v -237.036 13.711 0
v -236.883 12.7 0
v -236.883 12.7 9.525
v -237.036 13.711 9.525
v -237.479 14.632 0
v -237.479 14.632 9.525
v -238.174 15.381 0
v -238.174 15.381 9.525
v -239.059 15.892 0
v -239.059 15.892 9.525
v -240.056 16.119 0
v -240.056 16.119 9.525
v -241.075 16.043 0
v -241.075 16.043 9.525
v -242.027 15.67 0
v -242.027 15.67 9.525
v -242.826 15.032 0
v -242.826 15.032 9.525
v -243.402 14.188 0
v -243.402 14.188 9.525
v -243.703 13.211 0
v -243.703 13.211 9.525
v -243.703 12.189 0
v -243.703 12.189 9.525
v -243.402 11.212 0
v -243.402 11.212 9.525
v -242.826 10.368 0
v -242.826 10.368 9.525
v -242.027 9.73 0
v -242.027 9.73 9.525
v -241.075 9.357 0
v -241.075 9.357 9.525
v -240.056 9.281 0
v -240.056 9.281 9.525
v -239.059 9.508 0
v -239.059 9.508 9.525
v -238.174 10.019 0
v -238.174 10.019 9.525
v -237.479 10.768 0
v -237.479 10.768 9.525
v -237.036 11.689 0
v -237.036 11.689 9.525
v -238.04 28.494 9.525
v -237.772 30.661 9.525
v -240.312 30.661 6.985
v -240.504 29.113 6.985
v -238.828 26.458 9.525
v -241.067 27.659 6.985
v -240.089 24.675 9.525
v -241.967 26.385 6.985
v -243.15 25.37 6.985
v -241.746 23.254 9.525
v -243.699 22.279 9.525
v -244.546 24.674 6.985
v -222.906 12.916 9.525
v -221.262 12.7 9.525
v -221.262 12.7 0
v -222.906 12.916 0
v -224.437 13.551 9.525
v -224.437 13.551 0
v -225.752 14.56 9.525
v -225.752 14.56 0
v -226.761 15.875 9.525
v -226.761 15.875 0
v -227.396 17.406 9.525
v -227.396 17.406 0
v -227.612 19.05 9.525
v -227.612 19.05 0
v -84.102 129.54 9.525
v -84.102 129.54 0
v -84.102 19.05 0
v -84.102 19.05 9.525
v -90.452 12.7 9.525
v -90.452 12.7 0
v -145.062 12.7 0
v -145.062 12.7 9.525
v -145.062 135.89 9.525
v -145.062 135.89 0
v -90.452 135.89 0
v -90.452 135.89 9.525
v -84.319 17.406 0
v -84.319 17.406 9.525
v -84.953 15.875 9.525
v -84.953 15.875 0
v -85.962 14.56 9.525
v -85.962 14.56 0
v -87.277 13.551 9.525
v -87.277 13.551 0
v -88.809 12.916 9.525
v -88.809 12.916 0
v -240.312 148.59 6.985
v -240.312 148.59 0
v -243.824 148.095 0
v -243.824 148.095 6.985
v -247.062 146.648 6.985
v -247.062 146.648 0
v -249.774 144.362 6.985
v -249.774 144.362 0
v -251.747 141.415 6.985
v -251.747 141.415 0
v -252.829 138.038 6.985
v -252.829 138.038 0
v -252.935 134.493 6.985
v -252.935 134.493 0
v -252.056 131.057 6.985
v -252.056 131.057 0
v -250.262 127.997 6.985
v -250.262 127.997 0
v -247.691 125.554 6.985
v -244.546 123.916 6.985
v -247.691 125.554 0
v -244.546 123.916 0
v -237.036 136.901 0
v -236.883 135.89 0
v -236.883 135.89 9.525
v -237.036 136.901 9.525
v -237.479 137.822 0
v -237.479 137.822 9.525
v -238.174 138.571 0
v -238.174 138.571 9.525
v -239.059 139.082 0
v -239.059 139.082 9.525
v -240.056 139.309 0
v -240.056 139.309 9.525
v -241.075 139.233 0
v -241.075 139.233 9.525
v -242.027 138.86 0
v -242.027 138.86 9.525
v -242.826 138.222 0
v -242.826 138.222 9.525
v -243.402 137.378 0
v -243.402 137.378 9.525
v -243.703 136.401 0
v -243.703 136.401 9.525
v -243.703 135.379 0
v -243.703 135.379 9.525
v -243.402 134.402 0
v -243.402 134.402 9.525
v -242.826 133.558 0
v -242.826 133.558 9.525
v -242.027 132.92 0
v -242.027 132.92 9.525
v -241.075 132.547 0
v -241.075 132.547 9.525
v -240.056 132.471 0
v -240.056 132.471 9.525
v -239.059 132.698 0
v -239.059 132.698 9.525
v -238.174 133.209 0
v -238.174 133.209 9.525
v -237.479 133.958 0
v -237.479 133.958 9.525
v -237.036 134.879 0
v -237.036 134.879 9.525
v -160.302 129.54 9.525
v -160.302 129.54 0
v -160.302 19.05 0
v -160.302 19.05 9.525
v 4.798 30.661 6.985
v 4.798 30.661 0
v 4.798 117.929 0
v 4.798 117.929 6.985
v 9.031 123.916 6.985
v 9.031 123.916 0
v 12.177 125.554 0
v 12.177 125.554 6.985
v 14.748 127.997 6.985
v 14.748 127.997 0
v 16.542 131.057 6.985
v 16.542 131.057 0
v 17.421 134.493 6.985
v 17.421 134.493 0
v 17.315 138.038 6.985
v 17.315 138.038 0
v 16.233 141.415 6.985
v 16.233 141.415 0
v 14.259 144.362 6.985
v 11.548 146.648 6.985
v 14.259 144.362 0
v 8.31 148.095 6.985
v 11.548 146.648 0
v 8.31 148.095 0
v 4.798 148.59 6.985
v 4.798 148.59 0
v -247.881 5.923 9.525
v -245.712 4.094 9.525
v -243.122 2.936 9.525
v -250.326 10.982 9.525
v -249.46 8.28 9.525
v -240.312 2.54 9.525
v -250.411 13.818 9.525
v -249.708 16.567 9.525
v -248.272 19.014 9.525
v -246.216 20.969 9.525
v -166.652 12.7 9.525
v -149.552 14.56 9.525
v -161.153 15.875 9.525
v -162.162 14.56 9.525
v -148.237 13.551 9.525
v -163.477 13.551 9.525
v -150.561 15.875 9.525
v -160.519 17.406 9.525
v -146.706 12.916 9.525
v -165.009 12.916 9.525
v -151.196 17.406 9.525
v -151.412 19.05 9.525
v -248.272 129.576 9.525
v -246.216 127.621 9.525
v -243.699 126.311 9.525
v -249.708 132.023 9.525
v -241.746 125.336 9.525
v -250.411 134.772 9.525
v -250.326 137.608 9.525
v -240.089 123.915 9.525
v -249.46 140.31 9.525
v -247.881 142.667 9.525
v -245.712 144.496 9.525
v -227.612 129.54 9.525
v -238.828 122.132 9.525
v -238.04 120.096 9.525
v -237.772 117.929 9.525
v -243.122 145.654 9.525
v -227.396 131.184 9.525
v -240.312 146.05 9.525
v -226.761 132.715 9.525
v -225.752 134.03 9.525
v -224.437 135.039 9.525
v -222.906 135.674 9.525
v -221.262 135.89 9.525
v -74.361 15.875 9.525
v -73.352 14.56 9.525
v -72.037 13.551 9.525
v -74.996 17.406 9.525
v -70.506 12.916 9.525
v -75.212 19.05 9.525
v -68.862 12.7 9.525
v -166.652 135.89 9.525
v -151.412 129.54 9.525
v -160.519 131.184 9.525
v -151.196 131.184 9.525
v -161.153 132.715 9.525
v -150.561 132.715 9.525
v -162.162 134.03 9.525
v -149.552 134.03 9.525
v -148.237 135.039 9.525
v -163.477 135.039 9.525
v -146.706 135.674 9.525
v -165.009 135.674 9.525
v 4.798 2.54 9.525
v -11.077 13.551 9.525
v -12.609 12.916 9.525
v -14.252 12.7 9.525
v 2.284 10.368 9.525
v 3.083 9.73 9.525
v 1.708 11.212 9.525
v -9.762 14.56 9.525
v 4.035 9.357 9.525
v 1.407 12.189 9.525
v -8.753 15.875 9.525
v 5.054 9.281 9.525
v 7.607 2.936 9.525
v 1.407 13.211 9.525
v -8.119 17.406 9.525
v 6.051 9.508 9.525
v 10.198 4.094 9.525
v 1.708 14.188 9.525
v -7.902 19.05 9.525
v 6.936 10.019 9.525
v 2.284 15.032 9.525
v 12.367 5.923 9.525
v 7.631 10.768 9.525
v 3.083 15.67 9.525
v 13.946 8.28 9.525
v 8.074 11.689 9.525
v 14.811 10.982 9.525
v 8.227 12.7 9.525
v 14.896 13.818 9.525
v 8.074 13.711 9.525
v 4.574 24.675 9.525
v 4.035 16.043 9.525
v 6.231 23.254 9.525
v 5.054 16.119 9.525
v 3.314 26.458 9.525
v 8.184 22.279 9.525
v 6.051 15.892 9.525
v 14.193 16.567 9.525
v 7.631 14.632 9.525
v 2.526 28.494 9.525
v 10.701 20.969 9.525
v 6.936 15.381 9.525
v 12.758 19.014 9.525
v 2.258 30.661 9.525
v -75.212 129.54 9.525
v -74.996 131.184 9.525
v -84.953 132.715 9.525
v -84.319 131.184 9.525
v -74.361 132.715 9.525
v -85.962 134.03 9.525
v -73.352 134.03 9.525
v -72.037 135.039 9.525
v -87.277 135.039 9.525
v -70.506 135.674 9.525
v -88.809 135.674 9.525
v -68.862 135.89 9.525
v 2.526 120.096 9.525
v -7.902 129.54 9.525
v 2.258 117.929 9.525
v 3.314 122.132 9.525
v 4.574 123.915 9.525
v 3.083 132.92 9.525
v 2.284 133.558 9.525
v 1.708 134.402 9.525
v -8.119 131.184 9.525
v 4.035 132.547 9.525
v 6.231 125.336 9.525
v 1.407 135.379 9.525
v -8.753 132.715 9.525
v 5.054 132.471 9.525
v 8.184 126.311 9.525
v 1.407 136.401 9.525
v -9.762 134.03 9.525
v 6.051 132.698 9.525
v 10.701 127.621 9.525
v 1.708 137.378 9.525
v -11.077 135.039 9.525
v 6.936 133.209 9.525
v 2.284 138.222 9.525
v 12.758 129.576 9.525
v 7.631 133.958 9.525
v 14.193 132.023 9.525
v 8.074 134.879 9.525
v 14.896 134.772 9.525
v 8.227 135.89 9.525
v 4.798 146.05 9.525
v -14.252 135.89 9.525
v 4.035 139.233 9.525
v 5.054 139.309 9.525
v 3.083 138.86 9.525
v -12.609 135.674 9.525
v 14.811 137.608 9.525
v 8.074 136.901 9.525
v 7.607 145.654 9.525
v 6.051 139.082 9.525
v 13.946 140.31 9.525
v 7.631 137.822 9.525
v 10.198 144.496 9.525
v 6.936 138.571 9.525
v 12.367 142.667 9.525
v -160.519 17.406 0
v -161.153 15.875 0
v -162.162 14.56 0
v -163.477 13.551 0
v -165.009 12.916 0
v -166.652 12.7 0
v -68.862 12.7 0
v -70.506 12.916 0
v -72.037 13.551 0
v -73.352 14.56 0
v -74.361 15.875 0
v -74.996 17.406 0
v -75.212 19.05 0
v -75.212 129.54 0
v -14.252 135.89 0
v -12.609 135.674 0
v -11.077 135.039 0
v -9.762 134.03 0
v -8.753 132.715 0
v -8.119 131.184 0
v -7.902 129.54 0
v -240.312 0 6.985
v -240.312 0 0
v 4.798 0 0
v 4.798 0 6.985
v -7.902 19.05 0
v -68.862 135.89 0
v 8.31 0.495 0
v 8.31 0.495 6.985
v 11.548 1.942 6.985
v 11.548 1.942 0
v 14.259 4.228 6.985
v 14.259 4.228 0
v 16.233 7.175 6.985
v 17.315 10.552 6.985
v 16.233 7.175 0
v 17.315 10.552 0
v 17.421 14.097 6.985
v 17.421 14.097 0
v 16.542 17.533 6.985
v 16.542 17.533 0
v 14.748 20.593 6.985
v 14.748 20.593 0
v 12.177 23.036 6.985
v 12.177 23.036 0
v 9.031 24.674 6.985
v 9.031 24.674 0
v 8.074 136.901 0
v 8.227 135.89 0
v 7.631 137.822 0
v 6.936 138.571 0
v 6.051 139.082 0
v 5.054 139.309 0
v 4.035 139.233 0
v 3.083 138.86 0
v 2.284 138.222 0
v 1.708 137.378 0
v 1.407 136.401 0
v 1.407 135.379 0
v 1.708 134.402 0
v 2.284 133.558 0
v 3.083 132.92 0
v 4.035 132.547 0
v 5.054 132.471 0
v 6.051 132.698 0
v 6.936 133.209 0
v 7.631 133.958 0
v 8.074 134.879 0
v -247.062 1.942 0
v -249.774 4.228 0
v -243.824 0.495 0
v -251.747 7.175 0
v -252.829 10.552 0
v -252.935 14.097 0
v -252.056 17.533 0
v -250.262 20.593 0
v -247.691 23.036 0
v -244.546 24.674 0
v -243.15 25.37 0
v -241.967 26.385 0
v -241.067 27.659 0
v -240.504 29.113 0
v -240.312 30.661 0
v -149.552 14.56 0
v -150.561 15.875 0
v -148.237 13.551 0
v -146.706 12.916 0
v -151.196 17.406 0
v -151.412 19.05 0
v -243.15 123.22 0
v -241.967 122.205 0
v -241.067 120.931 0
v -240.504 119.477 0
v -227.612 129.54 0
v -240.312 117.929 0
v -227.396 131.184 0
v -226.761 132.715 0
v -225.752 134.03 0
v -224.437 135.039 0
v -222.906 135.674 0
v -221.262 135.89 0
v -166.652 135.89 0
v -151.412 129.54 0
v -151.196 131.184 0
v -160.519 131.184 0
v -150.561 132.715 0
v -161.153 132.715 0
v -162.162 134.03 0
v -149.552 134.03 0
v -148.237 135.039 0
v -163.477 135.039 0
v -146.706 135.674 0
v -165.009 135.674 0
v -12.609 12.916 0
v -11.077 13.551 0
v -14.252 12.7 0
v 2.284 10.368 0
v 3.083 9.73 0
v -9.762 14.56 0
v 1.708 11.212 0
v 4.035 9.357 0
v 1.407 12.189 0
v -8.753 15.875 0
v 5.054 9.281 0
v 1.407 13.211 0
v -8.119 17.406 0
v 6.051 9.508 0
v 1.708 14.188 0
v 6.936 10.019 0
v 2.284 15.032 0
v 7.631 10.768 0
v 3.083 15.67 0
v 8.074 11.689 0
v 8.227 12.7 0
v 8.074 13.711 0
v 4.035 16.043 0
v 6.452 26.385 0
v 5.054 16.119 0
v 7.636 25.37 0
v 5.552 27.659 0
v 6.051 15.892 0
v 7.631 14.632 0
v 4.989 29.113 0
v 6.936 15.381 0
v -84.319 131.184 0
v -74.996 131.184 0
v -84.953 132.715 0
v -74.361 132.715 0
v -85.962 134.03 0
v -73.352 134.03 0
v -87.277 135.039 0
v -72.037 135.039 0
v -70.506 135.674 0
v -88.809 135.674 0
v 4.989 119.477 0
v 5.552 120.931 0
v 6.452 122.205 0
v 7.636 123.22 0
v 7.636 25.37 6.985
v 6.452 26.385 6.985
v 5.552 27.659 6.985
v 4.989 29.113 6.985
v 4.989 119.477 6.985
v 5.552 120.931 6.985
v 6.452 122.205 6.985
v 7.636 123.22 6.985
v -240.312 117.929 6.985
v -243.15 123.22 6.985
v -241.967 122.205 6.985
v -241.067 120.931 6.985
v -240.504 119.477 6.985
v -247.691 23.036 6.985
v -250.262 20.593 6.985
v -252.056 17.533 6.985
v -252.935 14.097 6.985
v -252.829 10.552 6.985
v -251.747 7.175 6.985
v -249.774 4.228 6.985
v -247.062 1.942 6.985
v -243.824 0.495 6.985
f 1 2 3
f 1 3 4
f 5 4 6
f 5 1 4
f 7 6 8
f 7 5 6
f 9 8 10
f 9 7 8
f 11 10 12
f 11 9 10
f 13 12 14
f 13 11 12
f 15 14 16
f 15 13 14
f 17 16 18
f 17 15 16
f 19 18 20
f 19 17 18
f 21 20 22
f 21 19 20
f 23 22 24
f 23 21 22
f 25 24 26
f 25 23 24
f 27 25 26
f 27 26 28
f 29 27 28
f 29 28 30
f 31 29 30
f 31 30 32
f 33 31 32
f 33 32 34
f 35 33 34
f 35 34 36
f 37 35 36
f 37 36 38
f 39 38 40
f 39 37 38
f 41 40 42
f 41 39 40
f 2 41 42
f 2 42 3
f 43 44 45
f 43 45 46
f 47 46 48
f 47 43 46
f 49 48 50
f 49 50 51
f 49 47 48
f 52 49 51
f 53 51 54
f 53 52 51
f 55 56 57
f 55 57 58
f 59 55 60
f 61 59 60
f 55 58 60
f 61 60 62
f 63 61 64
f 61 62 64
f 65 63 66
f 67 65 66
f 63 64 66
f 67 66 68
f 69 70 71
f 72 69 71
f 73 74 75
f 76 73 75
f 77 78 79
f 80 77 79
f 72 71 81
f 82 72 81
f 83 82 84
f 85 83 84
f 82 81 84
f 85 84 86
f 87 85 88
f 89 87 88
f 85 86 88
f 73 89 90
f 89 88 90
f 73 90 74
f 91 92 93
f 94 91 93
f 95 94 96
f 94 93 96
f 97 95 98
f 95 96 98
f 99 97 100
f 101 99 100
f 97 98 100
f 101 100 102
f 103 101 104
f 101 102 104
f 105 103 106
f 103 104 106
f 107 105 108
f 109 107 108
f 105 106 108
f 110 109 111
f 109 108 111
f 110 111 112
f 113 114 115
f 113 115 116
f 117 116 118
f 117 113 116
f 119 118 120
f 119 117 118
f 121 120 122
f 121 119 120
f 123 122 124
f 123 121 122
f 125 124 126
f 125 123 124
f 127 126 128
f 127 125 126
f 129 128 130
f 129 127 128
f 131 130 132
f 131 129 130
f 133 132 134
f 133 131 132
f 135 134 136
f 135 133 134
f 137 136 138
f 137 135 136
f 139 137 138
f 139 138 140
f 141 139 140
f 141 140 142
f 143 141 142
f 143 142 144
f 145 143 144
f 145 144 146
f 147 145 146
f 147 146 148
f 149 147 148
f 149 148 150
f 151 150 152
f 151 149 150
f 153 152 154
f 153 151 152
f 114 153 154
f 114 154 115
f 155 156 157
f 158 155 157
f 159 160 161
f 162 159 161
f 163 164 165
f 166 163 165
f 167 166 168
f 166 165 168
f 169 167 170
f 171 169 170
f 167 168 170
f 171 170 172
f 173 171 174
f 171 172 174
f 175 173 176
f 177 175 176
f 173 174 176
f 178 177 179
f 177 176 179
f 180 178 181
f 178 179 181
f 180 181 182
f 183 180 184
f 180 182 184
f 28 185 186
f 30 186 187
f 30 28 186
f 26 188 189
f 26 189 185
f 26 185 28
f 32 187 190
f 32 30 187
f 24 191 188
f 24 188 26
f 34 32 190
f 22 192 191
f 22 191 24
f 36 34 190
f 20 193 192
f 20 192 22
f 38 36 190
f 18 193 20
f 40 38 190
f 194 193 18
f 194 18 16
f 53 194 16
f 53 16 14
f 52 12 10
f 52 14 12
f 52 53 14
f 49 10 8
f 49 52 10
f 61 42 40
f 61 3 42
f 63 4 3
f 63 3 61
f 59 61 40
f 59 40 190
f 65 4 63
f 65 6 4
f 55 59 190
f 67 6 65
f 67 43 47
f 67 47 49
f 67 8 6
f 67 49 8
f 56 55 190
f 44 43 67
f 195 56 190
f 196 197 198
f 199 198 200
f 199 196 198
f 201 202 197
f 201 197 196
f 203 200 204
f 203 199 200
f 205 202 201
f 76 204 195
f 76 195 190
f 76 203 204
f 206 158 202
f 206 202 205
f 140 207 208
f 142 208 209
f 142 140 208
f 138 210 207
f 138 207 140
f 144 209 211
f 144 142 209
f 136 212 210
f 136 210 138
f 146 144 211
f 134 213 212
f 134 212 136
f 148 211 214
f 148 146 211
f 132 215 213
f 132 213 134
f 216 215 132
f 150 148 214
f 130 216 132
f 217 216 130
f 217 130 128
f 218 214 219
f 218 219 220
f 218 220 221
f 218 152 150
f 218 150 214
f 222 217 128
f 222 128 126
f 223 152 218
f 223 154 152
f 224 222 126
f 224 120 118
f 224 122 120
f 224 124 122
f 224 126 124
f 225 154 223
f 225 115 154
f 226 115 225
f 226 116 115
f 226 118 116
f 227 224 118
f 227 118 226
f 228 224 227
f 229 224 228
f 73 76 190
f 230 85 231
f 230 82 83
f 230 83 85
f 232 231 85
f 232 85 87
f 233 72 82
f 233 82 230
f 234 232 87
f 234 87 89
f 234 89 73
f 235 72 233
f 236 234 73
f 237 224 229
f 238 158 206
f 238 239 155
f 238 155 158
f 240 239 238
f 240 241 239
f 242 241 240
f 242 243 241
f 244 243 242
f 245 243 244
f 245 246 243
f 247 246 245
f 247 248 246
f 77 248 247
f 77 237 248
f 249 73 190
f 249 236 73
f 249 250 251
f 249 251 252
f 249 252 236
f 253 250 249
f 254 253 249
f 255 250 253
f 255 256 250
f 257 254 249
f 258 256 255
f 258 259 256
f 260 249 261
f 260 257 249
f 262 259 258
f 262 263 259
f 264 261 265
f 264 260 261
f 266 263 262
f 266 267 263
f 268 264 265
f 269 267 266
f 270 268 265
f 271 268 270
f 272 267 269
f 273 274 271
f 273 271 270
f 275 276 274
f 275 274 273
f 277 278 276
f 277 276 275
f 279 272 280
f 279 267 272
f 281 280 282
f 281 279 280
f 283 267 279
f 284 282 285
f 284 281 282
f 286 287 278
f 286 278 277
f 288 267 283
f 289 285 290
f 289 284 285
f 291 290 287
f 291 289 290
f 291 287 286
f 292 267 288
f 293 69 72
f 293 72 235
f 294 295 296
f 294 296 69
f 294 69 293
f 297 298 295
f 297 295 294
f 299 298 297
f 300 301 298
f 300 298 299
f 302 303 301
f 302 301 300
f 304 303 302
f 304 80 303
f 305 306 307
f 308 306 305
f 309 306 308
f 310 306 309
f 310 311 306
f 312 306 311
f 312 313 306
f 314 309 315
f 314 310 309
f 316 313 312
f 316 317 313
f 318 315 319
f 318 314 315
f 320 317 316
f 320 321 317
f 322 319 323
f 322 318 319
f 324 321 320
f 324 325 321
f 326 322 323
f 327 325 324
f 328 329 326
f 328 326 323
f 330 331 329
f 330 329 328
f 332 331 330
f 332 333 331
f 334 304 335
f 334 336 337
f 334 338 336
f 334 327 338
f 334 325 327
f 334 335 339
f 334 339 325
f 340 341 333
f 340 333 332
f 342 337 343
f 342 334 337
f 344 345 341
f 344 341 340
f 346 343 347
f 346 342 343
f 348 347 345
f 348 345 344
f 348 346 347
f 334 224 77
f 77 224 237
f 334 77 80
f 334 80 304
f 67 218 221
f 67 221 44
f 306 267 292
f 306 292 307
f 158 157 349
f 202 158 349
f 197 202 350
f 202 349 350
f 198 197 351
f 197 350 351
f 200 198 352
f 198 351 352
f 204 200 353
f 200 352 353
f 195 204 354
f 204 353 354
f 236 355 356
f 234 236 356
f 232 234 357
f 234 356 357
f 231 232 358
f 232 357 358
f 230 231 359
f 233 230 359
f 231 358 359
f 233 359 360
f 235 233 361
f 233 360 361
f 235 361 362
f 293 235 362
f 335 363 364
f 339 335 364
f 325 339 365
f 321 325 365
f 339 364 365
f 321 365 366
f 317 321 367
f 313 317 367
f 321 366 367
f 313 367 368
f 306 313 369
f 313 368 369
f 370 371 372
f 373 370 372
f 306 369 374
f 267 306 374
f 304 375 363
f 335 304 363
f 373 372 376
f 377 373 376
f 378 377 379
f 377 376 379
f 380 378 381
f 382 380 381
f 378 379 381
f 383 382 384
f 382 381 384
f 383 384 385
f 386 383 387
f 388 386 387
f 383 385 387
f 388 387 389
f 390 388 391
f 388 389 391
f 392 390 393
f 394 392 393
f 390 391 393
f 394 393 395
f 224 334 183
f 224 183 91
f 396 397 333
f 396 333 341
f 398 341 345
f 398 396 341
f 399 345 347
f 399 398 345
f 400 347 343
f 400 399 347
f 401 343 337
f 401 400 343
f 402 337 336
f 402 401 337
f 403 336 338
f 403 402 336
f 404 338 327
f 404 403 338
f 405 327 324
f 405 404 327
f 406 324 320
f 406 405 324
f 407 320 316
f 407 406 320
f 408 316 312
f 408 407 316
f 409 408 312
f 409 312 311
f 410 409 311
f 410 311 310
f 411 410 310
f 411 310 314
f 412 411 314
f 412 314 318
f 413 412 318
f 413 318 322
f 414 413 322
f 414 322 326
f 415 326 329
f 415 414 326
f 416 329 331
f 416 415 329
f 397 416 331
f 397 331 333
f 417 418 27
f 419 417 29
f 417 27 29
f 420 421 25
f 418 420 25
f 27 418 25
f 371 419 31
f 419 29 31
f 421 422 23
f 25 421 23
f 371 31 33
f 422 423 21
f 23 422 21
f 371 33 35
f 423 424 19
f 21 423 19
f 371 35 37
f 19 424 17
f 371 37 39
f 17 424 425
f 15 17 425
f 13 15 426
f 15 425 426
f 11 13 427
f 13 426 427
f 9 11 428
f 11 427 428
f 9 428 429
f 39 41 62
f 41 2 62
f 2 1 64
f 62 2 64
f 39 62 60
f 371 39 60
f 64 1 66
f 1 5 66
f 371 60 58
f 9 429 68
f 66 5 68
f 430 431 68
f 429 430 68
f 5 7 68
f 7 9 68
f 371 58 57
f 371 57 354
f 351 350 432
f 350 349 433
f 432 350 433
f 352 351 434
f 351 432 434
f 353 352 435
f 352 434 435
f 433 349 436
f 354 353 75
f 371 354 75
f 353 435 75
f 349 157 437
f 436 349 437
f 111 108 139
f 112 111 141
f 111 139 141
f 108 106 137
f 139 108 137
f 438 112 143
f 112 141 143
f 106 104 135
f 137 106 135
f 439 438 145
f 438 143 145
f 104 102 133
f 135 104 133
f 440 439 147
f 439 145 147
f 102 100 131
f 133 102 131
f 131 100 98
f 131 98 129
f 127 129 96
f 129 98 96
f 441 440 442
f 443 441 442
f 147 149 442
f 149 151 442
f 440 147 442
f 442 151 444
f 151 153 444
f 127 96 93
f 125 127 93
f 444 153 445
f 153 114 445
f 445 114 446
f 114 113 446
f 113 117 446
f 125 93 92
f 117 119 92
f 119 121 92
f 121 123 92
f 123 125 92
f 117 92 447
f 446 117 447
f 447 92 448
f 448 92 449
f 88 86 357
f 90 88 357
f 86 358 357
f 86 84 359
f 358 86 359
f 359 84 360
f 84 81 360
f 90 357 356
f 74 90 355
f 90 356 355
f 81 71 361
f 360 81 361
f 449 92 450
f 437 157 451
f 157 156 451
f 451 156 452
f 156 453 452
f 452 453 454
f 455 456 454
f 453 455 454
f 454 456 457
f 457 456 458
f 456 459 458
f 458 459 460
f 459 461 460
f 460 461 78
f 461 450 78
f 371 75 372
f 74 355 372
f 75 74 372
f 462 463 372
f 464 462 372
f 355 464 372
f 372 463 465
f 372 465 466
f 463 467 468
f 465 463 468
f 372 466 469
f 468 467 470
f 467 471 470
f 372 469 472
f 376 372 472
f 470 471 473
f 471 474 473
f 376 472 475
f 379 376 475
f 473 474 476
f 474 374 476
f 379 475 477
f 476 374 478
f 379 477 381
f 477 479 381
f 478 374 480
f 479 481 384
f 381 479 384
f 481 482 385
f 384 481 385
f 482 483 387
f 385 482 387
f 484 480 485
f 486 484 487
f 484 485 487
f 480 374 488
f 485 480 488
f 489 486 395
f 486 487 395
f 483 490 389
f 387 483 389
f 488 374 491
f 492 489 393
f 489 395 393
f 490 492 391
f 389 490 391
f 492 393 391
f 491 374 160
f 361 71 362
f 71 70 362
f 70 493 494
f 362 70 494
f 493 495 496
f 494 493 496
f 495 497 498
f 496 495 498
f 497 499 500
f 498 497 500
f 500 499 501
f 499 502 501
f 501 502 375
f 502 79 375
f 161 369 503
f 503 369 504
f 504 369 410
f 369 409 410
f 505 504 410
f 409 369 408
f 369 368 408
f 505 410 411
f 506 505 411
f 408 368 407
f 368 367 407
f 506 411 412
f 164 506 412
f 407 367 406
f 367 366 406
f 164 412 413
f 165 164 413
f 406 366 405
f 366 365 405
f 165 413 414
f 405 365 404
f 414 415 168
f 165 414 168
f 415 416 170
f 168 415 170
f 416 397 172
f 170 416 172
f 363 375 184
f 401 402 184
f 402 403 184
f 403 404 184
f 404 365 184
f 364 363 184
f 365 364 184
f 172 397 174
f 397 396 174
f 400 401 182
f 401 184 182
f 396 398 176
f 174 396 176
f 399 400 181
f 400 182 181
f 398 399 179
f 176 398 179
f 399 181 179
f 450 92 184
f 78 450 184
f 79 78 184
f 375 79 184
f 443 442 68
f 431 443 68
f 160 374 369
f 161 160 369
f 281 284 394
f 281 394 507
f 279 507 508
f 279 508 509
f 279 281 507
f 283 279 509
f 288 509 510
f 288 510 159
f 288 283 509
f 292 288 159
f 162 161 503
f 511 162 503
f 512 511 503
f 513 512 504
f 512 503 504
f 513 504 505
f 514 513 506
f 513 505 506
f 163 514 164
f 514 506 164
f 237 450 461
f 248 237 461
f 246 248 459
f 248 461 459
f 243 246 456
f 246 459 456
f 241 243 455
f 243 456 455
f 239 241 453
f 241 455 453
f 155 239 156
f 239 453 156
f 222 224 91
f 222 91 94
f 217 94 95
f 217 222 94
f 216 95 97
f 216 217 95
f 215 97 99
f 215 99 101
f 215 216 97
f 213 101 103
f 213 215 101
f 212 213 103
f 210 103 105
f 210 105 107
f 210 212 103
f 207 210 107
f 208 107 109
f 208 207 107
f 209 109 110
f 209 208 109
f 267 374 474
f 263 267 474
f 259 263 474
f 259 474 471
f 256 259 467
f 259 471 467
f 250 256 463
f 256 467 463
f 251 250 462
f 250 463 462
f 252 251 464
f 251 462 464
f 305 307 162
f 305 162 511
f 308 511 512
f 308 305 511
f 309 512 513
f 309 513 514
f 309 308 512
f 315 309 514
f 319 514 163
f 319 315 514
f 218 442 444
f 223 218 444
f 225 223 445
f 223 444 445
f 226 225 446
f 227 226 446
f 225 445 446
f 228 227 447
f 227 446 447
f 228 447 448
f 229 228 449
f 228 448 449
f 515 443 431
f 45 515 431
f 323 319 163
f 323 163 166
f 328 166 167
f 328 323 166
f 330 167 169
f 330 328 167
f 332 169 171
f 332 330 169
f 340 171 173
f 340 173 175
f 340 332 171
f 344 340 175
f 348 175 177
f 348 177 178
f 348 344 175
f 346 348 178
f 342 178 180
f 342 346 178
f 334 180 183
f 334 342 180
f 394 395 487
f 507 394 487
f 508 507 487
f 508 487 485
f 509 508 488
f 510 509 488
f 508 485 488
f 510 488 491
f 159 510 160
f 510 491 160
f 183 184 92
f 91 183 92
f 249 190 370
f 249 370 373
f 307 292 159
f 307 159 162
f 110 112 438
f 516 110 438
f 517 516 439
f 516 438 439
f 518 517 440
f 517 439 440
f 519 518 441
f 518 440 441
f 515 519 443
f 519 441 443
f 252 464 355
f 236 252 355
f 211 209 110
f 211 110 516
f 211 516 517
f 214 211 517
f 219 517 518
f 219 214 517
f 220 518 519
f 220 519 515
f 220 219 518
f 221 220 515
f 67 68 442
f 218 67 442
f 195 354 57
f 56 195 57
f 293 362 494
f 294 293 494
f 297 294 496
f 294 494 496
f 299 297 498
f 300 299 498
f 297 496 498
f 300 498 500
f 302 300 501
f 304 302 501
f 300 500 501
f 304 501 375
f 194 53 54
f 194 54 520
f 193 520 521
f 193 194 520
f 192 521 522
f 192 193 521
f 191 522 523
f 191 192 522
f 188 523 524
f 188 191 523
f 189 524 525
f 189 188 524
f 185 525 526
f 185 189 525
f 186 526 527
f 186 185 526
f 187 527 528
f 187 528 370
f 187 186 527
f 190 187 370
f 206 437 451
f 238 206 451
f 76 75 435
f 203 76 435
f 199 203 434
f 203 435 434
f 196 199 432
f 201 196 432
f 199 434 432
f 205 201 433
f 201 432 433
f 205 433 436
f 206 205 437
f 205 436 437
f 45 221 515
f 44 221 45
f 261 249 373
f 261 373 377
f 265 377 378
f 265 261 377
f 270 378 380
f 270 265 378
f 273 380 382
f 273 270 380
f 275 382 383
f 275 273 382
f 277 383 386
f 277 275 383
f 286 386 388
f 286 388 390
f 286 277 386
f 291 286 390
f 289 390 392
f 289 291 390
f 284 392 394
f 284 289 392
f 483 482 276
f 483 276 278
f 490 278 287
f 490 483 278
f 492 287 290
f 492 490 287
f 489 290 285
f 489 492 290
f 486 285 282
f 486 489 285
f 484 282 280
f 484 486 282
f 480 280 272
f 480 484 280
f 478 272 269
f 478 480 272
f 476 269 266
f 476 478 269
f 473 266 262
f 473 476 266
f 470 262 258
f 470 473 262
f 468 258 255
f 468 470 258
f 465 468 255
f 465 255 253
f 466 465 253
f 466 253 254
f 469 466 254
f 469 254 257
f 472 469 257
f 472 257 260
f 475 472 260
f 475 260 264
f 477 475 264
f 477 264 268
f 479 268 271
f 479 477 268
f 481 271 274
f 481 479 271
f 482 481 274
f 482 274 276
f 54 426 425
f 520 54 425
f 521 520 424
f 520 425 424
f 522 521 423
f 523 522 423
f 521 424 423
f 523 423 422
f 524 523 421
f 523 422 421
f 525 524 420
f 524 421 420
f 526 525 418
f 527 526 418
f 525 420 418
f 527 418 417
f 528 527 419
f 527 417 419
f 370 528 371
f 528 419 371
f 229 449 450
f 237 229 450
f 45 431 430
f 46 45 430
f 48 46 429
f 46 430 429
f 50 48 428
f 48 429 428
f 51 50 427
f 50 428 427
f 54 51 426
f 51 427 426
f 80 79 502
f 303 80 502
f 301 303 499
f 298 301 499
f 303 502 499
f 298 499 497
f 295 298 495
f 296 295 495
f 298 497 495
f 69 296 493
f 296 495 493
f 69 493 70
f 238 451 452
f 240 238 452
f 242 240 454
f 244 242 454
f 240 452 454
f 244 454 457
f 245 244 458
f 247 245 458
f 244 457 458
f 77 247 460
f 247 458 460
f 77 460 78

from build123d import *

# Parameters (mm, degrees)
F0_R     = 3.429
F1_DEPTH = 9.525
F2_SIZE  = 2.54


with BuildPart() as f1:
    # F0 (on Top) → F1 (new body)
    with BuildSketch(Plane.XY):
        with BuildLine():
            Line((-117.757219, 148.59), (-240.312219, 148.59))
            ThreePointArc((-240.312219, 148.59), (-252.82932, 138.037595), (-244.545552, 123.916325))
            ThreePointArc((-244.545552, 123.916325), (-241.477465, 121.595662), (-240.312219, 117.929488))
            Line((-240.312219, 117.929488), (-240.312219, 30.660512))
            ThreePointArc((-240.312219, 30.660512), (-241.477465, 26.994338), (-244.545552, 24.673675))
            ThreePointArc((-244.545552, 24.673675), (-252.82932, 10.552405), (-240.312219, 0))
            Line((-240.312219, 0), (-117.757219, 0))
            Line((-117.757219, 0), (-117.757219, 12.7))
            Line((-117.757219, 12.7), (-145.062219, 12.7))
            ThreePointArc((-145.062219, 12.7), (-149.552347, 14.559872), (-151.412219, 19.05))
            Line((-151.412219, 19.05), (-151.412219, 129.54))
            ThreePointArc((-151.412219, 129.54), (-149.552347, 134.030128), (-145.062219, 135.89))
            Line((-145.062219, 135.89), (-117.757219, 135.89))
            Line((-117.757219, 135.89), (-117.757219, 148.59))
        make_face()
        with Locations((-240.312219, 12.7)):
            Circle(F0_R, mode=Mode.SUBTRACT)
        with BuildLine():
            ThreePointArc((-227.612219, 129.54), (-225.752347, 134.030128), (-221.262219, 135.89))
            Line((-221.262219, 135.89), (-166.652219, 135.89))
            ThreePointArc((-166.652219, 135.89), (-162.162091, 134.030128), (-160.302219, 129.54))
            Line((-160.302219, 129.54), (-160.302219, 19.05))
            ThreePointArc((-160.302219, 19.05), (-162.162091, 14.559872), (-166.652219, 12.7))
            Line((-166.652219, 12.7), (-221.262219, 12.7))
            ThreePointArc((-221.262219, 12.7), (-225.752347, 14.559872), (-227.612219, 19.05))
            Line((-227.612219, 19.05), (-227.612219, 129.54))
        make_face(mode=Mode.SUBTRACT)
        with Locations((-240.312219, 135.89)):
            Circle(F0_R, mode=Mode.SUBTRACT)
        with BuildLine():
            Line((4.797781, 148.59), (-117.757219, 148.59))
            Line((-117.757219, 148.59), (-117.757219, 135.89))
            Line((-117.757219, 135.89), (-90.452219, 135.89))
            ThreePointArc((-90.452219, 135.89), (-85.962091, 134.030128), (-84.102219, 129.54))
            Line((-84.102219, 129.54), (-84.102219, 19.05))
            ThreePointArc((-84.102219, 19.05), (-85.962091, 14.559872), (-90.452219, 12.7))
            Line((-90.452219, 12.7), (-117.757219, 12.7))
            Line((-117.757219, 12.7), (-117.757219, 0))
            Line((-117.757219, 0), (4.797781, 0))
            ThreePointArc((4.797781, 0), (17.314883, 10.552405), (9.031115, 24.673675))
            ThreePointArc((9.031115, 24.673675), (5.963028, 26.994338), (4.797781, 30.660512))
            Line((4.797781, 30.660512), (4.797781, 117.929488))
            ThreePointArc((4.797781, 117.929488), (5.963028, 121.595662), (9.031115, 123.916325))
            ThreePointArc((9.031115, 123.916325), (17.314883, 138.037595), (4.797781, 148.59))
        make_face()
        with Locations((4.797781, 12.7)):
            Circle(F0_R, mode=Mode.SUBTRACT)
        with BuildLine():
            Line((-7.902219, 129.54), (-7.902219, 19.05))
            ThreePointArc((-7.902219, 19.05), (-9.762091, 14.559872), (-14.252219, 12.7))
            Line((-14.252219, 12.7), (-68.862219, 12.7))
            ThreePointArc((-68.862219, 12.7), (-73.352347, 14.559872), (-75.212219, 19.05))
            Line((-75.212219, 19.05), (-75.212219, 129.54))
            ThreePointArc((-75.212219, 129.54), (-73.352347, 134.030128), (-68.862219, 135.89))
            Line((-68.862219, 135.89), (-14.252219, 135.89))
            ThreePointArc((-14.252219, 135.89), (-9.762091, 134.030128), (-7.902219, 129.54))
        make_face(mode=Mode.SUBTRACT)
        with Locations((4.797781, 135.89)):
            Circle(F0_R, mode=Mode.SUBTRACT)
    extrude(amount=F1_DEPTH)

    # F2
    f2_edges = [f1.edges().sort_by_distance(p)[0] for p in [
        (-117.757219, 0, 9.525),
    ]]
    chamfer(f2_edges, length=F2_SIZE)


solid = f1.part
